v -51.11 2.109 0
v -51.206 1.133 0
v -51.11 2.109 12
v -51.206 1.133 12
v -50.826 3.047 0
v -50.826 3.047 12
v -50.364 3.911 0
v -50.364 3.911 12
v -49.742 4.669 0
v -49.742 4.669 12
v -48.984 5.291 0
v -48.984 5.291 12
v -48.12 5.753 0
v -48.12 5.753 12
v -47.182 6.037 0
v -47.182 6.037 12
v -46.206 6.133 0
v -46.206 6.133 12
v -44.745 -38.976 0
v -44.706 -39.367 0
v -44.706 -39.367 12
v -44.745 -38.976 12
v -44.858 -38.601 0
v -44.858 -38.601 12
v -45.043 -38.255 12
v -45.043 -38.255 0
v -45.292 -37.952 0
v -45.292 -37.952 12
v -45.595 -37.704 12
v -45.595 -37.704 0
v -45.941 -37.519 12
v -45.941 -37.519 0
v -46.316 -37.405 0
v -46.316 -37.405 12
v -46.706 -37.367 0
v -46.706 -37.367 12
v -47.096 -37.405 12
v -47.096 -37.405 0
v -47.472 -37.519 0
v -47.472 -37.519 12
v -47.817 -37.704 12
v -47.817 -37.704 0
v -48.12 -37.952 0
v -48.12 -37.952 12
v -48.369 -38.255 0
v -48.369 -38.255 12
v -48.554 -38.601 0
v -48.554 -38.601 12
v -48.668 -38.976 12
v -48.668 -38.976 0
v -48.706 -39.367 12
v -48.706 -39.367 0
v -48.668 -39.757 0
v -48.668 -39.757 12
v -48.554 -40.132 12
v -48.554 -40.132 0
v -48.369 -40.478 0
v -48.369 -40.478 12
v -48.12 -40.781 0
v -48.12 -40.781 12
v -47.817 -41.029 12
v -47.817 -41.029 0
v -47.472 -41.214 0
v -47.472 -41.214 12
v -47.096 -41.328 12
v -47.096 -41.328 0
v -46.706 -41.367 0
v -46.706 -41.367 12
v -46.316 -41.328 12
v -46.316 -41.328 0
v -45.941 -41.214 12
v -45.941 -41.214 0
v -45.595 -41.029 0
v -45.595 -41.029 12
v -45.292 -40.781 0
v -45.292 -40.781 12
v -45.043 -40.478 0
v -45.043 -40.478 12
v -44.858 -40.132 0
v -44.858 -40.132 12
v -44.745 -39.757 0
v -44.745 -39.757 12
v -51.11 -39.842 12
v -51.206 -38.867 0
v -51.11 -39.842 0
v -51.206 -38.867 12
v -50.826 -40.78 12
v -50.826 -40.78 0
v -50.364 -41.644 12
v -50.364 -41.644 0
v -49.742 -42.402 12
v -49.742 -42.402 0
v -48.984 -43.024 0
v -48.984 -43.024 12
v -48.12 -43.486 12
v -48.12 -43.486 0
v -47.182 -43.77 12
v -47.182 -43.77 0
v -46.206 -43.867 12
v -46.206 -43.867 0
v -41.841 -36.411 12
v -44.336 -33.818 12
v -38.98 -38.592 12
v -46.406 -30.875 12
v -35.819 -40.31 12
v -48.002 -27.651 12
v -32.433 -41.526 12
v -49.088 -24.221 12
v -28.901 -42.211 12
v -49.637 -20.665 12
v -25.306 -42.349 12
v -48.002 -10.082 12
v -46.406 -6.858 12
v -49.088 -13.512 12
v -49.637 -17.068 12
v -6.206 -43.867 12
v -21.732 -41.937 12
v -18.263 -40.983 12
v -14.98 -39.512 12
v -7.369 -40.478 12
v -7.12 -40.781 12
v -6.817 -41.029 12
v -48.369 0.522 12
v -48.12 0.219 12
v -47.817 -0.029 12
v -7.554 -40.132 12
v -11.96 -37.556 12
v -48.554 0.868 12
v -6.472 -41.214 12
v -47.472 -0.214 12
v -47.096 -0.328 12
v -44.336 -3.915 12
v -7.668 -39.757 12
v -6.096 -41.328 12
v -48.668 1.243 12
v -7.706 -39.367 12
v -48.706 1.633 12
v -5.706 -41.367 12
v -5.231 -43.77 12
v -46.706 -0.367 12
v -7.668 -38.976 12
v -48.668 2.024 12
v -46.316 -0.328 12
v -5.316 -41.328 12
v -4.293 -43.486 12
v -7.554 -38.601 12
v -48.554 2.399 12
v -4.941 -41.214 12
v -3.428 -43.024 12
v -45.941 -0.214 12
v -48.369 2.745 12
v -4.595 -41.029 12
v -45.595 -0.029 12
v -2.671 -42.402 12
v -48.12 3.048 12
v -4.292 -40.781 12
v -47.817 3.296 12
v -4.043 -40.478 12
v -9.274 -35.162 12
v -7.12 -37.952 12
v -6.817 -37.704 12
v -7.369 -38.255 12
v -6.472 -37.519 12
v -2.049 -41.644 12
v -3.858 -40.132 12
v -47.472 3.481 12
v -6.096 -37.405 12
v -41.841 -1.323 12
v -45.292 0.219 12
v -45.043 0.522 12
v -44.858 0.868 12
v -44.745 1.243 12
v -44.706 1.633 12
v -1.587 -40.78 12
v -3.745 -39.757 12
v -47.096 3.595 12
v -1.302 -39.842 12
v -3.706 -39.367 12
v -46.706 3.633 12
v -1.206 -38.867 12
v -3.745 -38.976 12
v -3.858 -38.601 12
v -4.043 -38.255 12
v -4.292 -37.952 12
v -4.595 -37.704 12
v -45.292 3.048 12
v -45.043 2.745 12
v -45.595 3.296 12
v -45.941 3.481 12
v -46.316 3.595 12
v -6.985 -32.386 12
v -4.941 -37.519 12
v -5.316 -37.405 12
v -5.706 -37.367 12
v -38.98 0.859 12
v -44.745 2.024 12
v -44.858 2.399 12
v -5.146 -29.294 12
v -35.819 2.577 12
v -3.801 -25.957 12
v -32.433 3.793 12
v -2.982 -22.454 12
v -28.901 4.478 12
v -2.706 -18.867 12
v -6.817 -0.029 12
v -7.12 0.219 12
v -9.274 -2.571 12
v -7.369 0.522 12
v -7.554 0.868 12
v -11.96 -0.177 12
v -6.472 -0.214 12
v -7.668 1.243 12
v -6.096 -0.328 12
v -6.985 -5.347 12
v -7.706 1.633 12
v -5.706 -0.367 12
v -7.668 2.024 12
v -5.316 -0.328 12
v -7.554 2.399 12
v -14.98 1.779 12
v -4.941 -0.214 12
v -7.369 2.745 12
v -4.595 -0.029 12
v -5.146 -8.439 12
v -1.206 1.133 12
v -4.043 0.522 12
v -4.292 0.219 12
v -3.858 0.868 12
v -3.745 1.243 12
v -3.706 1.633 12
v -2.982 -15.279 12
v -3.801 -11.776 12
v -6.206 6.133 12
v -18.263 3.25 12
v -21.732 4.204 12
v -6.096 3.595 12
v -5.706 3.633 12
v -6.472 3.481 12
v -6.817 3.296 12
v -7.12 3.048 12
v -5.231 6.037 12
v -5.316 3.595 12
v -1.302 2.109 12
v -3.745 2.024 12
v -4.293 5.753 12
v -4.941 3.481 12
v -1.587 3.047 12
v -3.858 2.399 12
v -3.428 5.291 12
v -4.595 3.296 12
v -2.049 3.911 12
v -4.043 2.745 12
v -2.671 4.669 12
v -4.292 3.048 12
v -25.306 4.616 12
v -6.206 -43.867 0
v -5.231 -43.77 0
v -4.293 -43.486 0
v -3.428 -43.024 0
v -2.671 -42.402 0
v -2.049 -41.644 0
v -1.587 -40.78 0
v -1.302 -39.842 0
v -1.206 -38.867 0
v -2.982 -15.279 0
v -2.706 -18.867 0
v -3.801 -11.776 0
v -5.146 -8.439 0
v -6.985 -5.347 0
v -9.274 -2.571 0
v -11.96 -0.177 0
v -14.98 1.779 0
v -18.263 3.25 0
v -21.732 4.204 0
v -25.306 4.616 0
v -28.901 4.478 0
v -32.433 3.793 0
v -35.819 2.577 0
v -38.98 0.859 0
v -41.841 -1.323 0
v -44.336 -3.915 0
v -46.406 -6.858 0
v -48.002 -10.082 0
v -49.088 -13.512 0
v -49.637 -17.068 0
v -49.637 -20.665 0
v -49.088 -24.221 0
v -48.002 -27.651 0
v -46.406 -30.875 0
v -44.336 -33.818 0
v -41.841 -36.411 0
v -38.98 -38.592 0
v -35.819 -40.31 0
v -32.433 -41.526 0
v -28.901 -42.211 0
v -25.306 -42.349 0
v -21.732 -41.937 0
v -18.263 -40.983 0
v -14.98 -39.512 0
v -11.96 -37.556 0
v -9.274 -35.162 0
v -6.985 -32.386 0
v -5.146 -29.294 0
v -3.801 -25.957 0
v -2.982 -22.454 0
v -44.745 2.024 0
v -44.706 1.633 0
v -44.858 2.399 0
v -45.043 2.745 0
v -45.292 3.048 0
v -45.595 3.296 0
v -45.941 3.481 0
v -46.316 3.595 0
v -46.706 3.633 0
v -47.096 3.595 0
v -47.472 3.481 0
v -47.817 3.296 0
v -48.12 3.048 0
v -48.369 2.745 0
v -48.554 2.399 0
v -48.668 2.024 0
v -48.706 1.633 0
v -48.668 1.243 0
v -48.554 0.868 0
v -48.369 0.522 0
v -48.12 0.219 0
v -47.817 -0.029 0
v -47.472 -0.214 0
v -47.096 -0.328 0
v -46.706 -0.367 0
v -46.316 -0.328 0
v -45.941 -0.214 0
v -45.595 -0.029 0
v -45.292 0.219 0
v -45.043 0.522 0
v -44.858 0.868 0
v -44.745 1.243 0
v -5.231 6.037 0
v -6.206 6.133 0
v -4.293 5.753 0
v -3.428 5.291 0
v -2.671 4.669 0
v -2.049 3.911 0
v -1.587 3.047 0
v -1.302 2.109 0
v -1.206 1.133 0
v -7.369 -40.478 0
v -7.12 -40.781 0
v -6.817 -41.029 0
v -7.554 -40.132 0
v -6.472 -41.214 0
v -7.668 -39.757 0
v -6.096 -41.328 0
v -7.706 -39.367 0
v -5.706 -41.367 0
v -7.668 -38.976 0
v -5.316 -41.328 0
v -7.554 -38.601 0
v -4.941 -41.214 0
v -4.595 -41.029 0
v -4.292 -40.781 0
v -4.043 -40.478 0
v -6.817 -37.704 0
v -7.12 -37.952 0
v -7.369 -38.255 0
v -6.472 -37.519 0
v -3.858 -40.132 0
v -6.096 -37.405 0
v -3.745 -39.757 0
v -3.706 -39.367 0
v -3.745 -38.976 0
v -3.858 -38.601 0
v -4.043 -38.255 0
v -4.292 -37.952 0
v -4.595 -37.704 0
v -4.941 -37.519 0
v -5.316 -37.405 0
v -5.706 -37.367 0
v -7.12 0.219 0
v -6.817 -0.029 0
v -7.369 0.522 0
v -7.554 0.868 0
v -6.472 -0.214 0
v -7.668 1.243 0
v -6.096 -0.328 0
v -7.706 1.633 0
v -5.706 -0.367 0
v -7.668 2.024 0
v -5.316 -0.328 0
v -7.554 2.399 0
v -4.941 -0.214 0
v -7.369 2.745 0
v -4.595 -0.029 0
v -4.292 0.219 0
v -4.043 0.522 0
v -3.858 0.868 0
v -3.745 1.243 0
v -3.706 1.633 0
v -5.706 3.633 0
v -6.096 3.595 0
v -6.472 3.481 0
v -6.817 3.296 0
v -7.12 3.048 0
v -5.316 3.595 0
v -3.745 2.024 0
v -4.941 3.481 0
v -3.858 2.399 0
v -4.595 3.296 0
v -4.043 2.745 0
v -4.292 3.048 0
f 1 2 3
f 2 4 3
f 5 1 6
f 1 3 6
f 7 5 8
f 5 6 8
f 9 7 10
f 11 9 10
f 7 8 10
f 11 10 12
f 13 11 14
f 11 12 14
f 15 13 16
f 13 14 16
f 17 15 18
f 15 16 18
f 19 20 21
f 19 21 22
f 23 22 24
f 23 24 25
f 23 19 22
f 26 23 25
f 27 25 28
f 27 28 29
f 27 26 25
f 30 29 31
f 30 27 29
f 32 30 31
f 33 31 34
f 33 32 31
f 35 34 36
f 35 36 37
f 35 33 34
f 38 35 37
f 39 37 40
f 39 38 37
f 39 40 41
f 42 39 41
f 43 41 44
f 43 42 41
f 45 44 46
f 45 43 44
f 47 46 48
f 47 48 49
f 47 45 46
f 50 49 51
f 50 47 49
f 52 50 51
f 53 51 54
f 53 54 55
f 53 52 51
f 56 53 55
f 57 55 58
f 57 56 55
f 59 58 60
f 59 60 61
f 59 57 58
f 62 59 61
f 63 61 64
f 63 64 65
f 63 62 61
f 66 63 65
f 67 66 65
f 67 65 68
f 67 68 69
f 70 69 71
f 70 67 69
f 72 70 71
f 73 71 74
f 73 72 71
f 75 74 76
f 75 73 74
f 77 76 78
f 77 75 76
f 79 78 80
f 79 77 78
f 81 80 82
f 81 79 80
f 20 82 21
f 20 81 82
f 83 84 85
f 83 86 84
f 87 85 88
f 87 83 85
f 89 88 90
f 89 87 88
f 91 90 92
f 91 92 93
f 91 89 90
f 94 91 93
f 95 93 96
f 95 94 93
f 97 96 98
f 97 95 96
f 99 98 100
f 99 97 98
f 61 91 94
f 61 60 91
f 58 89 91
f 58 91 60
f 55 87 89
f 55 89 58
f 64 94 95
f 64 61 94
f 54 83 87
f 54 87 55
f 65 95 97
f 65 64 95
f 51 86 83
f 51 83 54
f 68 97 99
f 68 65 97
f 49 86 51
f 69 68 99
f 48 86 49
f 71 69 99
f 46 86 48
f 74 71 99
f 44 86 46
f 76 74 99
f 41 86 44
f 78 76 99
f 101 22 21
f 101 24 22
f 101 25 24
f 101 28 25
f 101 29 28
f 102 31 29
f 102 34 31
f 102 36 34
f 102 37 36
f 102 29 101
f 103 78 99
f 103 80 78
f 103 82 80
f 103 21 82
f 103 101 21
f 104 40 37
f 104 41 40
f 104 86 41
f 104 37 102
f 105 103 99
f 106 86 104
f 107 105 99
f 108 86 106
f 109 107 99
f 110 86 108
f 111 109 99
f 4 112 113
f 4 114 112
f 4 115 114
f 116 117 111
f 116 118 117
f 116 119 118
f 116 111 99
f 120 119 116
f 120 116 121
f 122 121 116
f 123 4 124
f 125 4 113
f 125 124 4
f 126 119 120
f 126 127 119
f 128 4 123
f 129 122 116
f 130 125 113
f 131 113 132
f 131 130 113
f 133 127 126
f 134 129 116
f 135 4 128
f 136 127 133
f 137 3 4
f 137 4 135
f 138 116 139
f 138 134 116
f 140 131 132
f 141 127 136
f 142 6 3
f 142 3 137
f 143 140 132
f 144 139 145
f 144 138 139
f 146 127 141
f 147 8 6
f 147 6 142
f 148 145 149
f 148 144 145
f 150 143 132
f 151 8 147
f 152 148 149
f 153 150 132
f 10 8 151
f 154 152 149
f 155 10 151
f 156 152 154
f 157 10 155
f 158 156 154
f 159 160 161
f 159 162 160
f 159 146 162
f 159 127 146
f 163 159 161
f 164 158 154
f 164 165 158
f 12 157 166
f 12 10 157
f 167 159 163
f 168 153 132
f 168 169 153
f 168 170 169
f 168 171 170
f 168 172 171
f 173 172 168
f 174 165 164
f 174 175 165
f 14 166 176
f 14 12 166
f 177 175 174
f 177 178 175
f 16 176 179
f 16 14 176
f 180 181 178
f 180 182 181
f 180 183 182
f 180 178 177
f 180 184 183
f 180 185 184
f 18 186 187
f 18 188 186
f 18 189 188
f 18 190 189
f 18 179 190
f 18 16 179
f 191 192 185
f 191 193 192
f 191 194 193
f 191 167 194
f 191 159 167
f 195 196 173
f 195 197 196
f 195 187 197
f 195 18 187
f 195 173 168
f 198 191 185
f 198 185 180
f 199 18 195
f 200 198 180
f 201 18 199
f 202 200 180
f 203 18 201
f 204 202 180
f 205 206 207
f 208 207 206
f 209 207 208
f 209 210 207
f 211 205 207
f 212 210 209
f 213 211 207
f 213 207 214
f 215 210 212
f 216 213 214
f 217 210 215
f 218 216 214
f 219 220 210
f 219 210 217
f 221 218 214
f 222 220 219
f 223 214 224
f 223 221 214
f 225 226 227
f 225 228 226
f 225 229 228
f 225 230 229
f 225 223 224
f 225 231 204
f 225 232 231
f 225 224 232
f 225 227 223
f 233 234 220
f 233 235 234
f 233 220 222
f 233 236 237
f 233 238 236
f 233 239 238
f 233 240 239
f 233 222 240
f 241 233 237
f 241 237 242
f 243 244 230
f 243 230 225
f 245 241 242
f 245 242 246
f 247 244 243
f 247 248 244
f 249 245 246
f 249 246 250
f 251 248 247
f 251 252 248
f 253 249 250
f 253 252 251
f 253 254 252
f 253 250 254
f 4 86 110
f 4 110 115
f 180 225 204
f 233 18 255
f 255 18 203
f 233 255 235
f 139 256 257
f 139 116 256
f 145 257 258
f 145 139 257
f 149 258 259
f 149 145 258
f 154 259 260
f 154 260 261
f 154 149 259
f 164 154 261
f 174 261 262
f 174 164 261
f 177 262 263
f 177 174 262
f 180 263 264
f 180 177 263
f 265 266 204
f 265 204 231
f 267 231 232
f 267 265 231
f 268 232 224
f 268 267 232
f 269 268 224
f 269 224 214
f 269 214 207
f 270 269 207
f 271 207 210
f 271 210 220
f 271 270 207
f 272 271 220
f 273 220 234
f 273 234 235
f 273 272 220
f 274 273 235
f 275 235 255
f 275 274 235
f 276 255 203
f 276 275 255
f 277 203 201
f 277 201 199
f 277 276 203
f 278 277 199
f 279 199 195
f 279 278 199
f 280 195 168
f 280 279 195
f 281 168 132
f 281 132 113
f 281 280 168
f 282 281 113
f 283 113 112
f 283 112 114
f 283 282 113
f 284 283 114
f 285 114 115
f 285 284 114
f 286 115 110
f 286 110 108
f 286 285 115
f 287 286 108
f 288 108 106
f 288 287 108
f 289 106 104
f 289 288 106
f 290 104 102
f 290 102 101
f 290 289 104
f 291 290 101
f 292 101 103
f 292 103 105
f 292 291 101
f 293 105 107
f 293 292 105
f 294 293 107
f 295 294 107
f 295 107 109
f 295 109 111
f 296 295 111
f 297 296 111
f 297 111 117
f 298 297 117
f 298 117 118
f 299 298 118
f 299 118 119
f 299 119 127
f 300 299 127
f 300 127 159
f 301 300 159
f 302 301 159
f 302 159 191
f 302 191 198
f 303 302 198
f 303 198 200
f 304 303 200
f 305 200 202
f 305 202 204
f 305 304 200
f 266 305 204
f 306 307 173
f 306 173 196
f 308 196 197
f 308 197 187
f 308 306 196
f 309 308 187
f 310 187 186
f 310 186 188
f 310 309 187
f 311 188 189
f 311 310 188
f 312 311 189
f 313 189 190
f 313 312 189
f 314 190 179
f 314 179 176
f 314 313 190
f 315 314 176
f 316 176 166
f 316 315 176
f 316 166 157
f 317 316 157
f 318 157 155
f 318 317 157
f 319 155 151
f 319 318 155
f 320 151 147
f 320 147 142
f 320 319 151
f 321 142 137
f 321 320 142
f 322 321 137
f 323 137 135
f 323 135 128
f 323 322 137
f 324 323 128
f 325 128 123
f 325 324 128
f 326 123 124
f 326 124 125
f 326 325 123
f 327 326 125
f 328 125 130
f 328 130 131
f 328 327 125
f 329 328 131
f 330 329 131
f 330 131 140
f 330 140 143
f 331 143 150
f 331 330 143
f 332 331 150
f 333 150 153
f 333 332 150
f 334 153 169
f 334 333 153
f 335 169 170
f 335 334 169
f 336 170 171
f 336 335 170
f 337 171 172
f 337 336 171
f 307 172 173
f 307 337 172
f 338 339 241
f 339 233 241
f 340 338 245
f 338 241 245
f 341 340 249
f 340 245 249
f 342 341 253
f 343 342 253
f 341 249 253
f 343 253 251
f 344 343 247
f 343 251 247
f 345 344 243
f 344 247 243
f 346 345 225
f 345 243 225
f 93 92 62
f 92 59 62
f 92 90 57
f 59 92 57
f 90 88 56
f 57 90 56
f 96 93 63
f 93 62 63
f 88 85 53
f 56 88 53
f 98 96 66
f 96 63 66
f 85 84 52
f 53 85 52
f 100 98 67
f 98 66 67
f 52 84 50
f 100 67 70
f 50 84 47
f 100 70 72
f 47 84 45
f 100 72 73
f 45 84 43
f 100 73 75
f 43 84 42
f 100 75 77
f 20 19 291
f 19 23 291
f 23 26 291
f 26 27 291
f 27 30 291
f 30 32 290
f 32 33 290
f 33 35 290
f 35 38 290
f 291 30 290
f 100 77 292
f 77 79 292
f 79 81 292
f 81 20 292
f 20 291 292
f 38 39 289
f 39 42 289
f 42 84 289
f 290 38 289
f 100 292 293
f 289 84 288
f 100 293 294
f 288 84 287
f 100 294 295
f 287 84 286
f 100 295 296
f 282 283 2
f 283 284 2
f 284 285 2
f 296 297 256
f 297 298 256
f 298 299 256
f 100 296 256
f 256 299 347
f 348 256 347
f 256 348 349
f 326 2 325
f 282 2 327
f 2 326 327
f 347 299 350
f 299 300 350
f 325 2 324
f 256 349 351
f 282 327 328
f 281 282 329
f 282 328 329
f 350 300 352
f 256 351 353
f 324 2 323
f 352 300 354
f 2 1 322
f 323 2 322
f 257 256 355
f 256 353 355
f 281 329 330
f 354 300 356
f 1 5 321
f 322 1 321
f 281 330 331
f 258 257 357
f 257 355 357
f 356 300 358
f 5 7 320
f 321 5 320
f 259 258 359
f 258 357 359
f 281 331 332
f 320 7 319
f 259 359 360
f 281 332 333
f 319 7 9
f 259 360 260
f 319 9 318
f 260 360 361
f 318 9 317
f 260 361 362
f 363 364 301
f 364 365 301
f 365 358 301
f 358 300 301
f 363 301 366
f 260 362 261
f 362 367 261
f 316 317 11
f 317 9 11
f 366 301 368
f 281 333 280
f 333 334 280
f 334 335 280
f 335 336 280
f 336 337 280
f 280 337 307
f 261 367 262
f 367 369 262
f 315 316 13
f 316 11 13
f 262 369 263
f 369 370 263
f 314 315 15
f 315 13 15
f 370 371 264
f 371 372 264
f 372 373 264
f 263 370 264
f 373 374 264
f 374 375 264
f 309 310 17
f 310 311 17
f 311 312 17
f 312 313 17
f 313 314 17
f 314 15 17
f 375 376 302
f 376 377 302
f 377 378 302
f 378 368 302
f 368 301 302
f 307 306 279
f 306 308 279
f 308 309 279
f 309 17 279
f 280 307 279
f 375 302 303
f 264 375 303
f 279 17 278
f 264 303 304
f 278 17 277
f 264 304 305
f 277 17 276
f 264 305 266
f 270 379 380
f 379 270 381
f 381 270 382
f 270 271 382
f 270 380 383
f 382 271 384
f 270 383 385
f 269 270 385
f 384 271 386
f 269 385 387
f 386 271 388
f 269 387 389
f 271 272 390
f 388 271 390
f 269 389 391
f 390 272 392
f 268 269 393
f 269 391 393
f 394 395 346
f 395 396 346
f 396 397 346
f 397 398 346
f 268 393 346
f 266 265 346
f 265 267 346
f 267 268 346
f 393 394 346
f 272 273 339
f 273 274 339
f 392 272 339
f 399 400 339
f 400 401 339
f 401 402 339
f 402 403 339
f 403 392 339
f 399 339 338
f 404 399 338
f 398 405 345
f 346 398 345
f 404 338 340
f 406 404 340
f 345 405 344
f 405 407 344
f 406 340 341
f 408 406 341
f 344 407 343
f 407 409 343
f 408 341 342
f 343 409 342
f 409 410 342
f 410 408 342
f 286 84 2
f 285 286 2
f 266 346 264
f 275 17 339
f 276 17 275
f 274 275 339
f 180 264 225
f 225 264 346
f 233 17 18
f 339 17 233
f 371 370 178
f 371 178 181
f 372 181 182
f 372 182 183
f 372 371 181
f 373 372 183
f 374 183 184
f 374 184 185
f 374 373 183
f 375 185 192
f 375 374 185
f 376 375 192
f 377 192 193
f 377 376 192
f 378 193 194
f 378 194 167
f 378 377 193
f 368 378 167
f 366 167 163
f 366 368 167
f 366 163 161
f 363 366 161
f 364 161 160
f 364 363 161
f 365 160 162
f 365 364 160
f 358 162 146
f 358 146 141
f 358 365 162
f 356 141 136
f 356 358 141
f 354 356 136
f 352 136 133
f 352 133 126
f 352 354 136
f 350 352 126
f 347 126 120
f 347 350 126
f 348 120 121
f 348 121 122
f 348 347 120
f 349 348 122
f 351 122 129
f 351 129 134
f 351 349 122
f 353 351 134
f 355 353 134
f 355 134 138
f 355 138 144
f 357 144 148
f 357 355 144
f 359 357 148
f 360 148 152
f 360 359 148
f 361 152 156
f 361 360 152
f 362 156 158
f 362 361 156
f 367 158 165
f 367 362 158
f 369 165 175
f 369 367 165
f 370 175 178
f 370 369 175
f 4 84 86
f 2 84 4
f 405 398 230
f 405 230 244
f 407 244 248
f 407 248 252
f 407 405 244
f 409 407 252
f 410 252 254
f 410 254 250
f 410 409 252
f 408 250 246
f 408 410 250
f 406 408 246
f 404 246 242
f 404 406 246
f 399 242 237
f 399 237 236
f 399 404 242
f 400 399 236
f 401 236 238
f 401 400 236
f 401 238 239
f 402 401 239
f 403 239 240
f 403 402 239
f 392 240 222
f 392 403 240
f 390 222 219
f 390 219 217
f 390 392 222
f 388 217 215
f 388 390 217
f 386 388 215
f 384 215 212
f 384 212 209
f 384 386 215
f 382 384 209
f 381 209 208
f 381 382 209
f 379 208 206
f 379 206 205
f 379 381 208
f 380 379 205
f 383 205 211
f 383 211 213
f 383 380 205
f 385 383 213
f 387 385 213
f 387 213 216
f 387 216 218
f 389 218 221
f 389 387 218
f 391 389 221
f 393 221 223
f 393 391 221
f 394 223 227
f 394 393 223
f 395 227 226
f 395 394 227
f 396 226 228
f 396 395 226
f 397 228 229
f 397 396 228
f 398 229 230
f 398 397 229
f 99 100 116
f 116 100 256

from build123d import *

# Parameters (mm, degrees)
SKETCH_1_W      = 50
SKETCH_1_H      = 50
SKETCH_1_R      = 2
SKETCH_1_R_2    = 23.5
EXTRUDE_1_DEPTH = 12
FILLET_1_R      = 5


with BuildPart() as part:
    # 草图1 → 凸台-拉伸1 (new body)
    with BuildSketch(Plane.XY):
        with Locations((-26.20618851, -18.866504484)):
            Rectangle(SKETCH_1_W, SKETCH_1_H)
        with Locations((-46.70618851, -39.366504484)):
            Circle(SKETCH_1_R, mode=Mode.SUBTRACT)
        with Locations((-5.70618851, -39.366504484)):
            Circle(SKETCH_1_R, mode=Mode.SUBTRACT)
        with Locations((-5.70618851, 1.633495516)):
            Circle(SKETCH_1_R, mode=Mode.SUBTRACT)
        with Locations((-46.70618851, 1.633495516)):
            Circle(SKETCH_1_R, mode=Mode.SUBTRACT)
        with Locations((-26.20618851, -18.866504484)):
            Circle(SKETCH_1_R_2, mode=Mode.SUBTRACT)
    extrude(amount=EXTRUDE_1_DEPTH)

    # 圆角1
    fillet_1_edges = [part.edges().sort_by_distance(p)[0] for p in [
        (-51.20618851, 6.133495516, 6),
        (-1.20618851, 6.133495516, 6),
        (-1.20618851, -43.866504484, 6),
        (-51.20618851, -43.866504484, 6),
    ]]
    fillet(fillet_1_edges, radius=FILLET_1_R)


solid = part.part
